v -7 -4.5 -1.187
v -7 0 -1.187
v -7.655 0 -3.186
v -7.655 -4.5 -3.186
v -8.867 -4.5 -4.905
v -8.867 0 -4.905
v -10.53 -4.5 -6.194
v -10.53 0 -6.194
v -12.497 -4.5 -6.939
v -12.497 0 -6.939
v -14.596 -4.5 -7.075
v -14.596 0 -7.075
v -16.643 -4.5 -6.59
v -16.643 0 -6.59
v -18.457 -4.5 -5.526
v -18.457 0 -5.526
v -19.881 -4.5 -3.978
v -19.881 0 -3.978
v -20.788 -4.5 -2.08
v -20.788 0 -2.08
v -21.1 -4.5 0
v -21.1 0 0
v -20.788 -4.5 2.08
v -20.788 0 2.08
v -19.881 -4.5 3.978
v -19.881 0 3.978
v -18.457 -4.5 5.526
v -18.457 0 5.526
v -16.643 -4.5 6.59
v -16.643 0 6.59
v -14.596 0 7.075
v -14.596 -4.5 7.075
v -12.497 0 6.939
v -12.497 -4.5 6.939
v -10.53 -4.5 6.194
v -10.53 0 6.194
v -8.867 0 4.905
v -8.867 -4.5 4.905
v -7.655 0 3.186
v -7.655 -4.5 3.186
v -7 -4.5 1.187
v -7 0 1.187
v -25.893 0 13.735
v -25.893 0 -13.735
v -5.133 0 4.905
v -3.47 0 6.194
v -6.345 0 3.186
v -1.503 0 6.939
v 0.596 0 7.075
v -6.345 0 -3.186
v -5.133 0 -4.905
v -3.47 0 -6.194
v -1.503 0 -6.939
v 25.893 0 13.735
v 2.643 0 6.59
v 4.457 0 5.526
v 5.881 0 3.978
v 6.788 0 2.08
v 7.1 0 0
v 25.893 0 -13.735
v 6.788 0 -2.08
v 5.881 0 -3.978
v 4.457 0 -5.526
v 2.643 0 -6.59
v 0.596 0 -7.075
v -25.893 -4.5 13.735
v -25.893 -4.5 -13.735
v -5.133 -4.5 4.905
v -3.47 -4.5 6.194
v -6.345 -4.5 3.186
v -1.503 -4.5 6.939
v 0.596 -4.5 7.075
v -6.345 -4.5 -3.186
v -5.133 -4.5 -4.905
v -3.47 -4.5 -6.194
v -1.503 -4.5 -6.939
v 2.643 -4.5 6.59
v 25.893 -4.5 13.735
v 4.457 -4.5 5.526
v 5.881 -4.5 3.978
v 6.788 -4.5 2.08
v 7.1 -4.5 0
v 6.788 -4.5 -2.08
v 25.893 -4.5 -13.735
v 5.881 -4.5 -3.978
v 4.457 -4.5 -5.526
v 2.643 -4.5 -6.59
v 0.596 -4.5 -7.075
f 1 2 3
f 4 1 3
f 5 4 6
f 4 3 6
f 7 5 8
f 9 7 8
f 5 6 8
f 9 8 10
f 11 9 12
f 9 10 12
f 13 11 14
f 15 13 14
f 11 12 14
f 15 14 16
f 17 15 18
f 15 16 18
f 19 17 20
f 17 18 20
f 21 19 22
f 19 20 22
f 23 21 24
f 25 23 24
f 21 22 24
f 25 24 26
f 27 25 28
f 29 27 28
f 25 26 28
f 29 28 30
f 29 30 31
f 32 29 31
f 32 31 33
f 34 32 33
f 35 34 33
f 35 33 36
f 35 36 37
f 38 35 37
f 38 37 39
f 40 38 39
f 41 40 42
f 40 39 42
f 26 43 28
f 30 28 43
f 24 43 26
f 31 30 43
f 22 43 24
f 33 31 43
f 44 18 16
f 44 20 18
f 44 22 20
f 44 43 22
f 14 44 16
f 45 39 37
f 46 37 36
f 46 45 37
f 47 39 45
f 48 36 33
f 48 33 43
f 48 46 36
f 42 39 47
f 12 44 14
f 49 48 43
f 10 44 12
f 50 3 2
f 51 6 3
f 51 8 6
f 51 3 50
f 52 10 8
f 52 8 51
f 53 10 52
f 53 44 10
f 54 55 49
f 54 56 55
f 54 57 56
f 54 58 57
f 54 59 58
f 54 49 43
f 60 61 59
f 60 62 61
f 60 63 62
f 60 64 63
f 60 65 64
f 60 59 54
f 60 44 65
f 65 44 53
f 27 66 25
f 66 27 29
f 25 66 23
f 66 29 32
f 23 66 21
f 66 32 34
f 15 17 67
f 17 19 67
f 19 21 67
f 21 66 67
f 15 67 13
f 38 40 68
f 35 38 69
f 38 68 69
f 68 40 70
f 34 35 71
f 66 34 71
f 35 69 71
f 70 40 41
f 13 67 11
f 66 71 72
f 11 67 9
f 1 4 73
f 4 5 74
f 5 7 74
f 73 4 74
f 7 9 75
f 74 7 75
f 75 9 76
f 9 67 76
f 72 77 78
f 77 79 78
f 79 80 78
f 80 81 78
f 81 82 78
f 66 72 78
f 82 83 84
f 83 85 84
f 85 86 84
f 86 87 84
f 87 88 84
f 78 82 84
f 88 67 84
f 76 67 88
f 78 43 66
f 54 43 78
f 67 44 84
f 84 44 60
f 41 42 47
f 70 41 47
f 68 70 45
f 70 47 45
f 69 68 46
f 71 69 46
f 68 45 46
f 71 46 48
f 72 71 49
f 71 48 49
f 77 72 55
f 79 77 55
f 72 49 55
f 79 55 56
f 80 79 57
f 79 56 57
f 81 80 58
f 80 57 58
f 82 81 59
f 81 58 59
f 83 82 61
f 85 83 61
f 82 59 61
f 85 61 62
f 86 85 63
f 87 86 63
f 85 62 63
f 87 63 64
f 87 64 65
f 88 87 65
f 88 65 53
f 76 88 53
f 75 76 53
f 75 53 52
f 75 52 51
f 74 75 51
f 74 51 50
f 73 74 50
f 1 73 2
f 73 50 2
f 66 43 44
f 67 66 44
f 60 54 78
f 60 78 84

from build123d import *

# Parameters (mm, degrees)
SKETCH1_W           = 51.785459028
SKETCH1_H           = 27.470306908
BOSS_EXTRUDE1_DEPTH = 4.5


with BuildPart() as part:
    # Sketch1 → Boss-Extrude1 (new body)
    with BuildSketch(Plane(origin=(0, 0, 0), x_dir=(1, 0, 0), z_dir=(0, 1, 0))):
        Rectangle(SKETCH1_W, SKETCH1_H)
        with BuildLine():
            ThreePointArc((-7, 1.187434209), (-21.1, 0), (-7, -1.187434209))
            ThreePointArc((-7, -1.187434209), (7.1, 0), (-7, 1.187434209))
        make_face(mode=Mode.SUBTRACT)
    extrude(amount=-BOSS_EXTRUDE1_DEPTH)


solid = part.part
